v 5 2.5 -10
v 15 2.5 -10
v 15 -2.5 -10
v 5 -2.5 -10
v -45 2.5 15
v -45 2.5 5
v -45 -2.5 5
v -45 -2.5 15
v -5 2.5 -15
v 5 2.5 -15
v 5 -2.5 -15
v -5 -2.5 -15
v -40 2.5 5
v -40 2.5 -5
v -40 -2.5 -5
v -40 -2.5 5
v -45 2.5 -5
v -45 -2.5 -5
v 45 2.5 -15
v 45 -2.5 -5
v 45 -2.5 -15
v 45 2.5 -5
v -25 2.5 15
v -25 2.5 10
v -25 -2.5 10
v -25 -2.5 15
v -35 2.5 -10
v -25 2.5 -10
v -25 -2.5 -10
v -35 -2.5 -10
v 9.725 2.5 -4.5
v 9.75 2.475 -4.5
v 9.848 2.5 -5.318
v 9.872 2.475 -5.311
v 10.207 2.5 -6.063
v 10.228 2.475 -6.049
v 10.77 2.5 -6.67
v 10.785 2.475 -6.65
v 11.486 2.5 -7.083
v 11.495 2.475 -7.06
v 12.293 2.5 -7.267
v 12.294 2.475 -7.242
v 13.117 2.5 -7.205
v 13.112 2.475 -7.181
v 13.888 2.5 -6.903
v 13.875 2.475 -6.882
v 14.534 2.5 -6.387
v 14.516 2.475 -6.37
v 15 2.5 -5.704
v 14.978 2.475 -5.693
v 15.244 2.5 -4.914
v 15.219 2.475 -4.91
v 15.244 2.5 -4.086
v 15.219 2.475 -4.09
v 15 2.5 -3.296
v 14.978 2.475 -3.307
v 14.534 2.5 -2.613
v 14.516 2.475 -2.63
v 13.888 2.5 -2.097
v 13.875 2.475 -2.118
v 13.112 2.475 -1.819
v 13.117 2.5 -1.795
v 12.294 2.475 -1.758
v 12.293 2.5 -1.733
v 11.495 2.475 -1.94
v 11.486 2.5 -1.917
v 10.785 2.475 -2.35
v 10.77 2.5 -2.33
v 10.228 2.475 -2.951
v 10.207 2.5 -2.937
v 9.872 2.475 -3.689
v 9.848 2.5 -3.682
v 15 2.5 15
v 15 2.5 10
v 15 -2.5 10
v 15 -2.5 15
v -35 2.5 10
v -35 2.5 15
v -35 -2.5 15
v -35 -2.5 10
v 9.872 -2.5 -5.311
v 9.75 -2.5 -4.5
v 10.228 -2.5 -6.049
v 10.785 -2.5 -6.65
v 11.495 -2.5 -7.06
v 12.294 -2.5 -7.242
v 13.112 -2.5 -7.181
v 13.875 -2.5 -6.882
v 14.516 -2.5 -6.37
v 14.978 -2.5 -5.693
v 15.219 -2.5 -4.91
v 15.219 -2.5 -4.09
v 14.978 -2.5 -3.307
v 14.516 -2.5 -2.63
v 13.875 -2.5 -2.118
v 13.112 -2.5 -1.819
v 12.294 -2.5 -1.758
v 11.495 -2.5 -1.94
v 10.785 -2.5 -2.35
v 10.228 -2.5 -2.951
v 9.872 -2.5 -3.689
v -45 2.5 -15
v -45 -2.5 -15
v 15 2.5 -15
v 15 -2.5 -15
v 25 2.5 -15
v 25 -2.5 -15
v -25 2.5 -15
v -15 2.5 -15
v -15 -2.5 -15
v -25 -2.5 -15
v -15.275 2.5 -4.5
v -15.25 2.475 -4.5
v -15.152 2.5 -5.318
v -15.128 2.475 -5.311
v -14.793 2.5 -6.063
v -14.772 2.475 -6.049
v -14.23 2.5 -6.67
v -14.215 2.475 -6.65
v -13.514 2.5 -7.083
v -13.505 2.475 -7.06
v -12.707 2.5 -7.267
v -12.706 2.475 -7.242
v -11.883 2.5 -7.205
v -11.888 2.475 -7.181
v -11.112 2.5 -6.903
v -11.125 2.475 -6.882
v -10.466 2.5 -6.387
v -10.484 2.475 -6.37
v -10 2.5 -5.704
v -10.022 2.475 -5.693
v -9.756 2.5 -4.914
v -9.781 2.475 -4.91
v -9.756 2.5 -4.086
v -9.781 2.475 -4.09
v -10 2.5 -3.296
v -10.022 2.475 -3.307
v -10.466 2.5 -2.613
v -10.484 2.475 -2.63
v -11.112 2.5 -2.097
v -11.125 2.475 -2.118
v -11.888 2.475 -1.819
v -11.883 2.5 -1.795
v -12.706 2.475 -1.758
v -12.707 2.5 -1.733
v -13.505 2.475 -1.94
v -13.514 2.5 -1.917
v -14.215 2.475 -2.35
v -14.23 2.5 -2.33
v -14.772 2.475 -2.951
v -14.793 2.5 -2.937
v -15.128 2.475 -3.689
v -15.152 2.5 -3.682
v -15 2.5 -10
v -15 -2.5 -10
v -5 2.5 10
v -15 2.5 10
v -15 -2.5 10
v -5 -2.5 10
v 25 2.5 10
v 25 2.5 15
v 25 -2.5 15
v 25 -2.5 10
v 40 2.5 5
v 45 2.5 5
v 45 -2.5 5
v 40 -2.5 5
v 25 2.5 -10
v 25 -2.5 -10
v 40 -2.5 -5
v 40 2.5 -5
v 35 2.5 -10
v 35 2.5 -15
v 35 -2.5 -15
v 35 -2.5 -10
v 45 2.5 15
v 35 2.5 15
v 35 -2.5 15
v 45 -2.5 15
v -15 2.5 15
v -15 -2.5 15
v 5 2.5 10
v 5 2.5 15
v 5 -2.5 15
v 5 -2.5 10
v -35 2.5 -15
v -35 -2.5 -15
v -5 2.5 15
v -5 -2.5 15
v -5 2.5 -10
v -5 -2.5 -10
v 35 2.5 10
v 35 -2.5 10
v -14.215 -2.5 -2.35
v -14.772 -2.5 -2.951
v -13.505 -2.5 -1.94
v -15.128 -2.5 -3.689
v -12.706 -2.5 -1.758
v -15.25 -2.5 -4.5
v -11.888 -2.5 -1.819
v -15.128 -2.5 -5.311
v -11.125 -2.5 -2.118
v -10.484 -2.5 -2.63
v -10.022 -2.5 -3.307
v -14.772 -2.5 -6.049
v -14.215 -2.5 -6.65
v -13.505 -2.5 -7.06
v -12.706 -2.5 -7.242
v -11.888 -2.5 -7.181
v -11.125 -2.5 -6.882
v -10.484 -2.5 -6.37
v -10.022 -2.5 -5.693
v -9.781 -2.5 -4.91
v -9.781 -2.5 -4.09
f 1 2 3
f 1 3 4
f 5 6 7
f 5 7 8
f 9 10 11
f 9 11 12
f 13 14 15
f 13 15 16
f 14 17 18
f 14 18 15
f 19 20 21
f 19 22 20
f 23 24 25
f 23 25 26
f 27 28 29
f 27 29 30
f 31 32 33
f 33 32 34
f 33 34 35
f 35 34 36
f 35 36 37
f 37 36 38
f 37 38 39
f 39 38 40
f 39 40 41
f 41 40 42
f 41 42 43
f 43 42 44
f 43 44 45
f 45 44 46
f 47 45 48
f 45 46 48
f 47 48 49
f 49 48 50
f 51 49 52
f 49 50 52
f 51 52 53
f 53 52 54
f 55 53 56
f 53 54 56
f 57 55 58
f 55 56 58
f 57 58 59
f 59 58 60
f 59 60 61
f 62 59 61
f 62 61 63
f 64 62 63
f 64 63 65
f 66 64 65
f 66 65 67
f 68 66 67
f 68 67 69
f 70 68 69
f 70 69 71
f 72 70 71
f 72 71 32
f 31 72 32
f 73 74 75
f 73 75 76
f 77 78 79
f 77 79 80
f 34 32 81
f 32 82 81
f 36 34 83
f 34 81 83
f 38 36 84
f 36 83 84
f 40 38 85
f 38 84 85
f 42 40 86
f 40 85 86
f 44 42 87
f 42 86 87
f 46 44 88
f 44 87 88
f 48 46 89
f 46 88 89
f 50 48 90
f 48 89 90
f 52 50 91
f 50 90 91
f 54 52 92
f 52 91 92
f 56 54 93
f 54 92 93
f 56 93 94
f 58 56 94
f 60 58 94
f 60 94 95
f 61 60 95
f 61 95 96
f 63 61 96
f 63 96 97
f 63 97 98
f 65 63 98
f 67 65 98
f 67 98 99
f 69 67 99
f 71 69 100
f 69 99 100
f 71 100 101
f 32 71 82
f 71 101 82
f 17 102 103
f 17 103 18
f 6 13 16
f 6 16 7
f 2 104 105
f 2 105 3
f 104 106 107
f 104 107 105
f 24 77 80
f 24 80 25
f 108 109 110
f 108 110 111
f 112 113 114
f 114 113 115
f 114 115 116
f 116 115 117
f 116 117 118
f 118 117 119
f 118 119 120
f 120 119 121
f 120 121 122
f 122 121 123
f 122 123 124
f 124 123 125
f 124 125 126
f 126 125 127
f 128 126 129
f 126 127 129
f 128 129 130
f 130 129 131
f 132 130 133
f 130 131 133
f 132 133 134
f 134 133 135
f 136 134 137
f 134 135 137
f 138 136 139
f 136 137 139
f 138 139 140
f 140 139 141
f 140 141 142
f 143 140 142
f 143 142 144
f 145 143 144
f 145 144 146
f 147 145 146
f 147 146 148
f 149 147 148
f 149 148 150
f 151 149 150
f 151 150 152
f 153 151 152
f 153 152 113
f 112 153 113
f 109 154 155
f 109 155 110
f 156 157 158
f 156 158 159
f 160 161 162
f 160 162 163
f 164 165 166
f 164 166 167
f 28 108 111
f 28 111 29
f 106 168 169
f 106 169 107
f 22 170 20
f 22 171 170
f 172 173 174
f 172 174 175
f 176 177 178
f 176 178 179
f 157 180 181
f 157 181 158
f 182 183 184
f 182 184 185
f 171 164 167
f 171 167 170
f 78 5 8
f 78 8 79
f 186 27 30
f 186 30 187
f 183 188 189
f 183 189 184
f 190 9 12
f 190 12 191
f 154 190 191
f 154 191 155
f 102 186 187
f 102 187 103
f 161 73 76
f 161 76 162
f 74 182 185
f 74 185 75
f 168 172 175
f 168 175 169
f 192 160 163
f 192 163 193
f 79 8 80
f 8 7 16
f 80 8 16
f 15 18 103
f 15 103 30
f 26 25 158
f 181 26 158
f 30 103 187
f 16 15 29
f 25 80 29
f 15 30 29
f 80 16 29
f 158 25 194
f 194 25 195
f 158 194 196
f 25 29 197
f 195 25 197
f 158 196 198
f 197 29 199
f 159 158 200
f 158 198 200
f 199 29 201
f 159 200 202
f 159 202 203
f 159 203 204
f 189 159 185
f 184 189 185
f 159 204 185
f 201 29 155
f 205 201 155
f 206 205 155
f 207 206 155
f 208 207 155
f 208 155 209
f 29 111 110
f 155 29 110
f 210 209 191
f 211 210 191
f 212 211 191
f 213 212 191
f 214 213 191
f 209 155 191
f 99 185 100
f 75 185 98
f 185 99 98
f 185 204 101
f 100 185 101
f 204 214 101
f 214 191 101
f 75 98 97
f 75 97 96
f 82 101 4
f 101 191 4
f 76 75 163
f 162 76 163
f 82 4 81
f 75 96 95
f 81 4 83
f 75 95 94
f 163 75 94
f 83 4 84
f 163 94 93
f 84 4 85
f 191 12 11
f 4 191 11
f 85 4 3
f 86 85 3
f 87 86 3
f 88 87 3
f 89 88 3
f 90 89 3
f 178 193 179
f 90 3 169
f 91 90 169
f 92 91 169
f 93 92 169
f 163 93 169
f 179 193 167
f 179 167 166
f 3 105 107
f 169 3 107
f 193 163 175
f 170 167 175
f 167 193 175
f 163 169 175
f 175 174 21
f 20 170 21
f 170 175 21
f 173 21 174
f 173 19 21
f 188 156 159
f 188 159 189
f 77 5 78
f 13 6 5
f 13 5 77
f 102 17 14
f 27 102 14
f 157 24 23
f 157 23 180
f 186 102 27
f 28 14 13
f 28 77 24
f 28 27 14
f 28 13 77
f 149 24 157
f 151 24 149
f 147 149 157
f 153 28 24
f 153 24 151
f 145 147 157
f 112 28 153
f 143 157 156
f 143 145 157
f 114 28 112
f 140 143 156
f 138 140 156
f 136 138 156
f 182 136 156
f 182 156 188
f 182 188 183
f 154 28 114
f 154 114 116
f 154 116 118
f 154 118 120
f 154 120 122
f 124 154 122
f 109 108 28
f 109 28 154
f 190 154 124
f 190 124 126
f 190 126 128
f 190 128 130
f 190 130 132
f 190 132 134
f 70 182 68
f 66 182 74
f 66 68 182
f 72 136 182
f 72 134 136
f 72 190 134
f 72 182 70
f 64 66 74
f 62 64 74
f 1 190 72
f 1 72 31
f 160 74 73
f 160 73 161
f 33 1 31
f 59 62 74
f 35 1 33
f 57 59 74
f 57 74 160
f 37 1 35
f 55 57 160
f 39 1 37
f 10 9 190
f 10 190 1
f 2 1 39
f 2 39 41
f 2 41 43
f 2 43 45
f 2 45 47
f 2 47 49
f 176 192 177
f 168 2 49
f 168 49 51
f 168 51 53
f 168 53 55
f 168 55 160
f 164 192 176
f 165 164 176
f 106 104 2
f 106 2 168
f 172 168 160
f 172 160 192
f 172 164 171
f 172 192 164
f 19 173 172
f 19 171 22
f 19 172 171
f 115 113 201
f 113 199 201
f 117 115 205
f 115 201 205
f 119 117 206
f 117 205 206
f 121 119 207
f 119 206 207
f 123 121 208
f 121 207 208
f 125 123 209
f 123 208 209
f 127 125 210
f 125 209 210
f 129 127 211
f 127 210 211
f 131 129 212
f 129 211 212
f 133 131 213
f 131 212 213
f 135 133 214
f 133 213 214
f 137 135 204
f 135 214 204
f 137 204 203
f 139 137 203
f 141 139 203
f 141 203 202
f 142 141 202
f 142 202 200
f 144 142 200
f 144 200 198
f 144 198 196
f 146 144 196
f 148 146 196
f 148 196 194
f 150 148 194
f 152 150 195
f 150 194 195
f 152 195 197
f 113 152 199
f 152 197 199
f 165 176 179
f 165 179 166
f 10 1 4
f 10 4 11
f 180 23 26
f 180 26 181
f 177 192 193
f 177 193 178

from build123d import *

# Parameters (mm, degrees)
BOSS_EXTRUDE1_DEPTH            = 2.5
M5_CLEARANCE_HOLE1_D           = 5.5
M5_CLEARANCE_HOLE1_CSINK_D     = 5.55
M5_CLEARANCE_HOLE1_CSINK_ANGLE = 90


with BuildPart() as part:
    # Sketch1 → Boss-Extrude1 (new, symmetric)
    with BuildSketch(Plane(origin=(0, 0, 0), x_dir=(1, 0, 0), z_dir=(0, 1, 0))):
        Polygon((45, 15), (40, 15), (35, 15), (35, 10), (25, 10), (25, 15), (15, 15), (15, 10), (5, 10), (5, 15), (-5, 15), (-5, 10), (-15, 10), (-15, 15), (-25, 15), (-25, 10), (-35, 10), (-35, 15), (-40, 15), (-45, 15), (-45, 10), (-45, 5), (-40, 5), (-40, -5), (-45, -5), (-45, -10), (-45, -15), (-40, -15), (-35, -15), (-35, -10), (-25, -10), (-25, -15), (-15, -15), (-15, -10), (-5, -10), (-5, -15), (5, -15), (5, -10), (15, -10), (15, -15), (25, -15), (25, -10), (35, -10), (35, -15), (40, -15), (45, -15), (45, -10), (45, -5), (40, -5), (40, 5), (45, 5), (45, 10), align=None)
    extrude(amount=BOSS_EXTRUDE1_DEPTH, both=True)

    # M5 Clearance Hole1 (through all)
    with Locations(Plane(origin=(0, 2.5, 0), x_dir=(1, 0, 0), z_dir=(0, 1, 0))):
        with Locations((12.5, 4.5), (-12.5, 4.5)):
            CounterSinkHole(M5_CLEARANCE_HOLE1_D / 2, M5_CLEARANCE_HOLE1_CSINK_D / 2, counter_sink_angle=M5_CLEARANCE_HOLE1_CSINK_ANGLE)


solid = part.part
